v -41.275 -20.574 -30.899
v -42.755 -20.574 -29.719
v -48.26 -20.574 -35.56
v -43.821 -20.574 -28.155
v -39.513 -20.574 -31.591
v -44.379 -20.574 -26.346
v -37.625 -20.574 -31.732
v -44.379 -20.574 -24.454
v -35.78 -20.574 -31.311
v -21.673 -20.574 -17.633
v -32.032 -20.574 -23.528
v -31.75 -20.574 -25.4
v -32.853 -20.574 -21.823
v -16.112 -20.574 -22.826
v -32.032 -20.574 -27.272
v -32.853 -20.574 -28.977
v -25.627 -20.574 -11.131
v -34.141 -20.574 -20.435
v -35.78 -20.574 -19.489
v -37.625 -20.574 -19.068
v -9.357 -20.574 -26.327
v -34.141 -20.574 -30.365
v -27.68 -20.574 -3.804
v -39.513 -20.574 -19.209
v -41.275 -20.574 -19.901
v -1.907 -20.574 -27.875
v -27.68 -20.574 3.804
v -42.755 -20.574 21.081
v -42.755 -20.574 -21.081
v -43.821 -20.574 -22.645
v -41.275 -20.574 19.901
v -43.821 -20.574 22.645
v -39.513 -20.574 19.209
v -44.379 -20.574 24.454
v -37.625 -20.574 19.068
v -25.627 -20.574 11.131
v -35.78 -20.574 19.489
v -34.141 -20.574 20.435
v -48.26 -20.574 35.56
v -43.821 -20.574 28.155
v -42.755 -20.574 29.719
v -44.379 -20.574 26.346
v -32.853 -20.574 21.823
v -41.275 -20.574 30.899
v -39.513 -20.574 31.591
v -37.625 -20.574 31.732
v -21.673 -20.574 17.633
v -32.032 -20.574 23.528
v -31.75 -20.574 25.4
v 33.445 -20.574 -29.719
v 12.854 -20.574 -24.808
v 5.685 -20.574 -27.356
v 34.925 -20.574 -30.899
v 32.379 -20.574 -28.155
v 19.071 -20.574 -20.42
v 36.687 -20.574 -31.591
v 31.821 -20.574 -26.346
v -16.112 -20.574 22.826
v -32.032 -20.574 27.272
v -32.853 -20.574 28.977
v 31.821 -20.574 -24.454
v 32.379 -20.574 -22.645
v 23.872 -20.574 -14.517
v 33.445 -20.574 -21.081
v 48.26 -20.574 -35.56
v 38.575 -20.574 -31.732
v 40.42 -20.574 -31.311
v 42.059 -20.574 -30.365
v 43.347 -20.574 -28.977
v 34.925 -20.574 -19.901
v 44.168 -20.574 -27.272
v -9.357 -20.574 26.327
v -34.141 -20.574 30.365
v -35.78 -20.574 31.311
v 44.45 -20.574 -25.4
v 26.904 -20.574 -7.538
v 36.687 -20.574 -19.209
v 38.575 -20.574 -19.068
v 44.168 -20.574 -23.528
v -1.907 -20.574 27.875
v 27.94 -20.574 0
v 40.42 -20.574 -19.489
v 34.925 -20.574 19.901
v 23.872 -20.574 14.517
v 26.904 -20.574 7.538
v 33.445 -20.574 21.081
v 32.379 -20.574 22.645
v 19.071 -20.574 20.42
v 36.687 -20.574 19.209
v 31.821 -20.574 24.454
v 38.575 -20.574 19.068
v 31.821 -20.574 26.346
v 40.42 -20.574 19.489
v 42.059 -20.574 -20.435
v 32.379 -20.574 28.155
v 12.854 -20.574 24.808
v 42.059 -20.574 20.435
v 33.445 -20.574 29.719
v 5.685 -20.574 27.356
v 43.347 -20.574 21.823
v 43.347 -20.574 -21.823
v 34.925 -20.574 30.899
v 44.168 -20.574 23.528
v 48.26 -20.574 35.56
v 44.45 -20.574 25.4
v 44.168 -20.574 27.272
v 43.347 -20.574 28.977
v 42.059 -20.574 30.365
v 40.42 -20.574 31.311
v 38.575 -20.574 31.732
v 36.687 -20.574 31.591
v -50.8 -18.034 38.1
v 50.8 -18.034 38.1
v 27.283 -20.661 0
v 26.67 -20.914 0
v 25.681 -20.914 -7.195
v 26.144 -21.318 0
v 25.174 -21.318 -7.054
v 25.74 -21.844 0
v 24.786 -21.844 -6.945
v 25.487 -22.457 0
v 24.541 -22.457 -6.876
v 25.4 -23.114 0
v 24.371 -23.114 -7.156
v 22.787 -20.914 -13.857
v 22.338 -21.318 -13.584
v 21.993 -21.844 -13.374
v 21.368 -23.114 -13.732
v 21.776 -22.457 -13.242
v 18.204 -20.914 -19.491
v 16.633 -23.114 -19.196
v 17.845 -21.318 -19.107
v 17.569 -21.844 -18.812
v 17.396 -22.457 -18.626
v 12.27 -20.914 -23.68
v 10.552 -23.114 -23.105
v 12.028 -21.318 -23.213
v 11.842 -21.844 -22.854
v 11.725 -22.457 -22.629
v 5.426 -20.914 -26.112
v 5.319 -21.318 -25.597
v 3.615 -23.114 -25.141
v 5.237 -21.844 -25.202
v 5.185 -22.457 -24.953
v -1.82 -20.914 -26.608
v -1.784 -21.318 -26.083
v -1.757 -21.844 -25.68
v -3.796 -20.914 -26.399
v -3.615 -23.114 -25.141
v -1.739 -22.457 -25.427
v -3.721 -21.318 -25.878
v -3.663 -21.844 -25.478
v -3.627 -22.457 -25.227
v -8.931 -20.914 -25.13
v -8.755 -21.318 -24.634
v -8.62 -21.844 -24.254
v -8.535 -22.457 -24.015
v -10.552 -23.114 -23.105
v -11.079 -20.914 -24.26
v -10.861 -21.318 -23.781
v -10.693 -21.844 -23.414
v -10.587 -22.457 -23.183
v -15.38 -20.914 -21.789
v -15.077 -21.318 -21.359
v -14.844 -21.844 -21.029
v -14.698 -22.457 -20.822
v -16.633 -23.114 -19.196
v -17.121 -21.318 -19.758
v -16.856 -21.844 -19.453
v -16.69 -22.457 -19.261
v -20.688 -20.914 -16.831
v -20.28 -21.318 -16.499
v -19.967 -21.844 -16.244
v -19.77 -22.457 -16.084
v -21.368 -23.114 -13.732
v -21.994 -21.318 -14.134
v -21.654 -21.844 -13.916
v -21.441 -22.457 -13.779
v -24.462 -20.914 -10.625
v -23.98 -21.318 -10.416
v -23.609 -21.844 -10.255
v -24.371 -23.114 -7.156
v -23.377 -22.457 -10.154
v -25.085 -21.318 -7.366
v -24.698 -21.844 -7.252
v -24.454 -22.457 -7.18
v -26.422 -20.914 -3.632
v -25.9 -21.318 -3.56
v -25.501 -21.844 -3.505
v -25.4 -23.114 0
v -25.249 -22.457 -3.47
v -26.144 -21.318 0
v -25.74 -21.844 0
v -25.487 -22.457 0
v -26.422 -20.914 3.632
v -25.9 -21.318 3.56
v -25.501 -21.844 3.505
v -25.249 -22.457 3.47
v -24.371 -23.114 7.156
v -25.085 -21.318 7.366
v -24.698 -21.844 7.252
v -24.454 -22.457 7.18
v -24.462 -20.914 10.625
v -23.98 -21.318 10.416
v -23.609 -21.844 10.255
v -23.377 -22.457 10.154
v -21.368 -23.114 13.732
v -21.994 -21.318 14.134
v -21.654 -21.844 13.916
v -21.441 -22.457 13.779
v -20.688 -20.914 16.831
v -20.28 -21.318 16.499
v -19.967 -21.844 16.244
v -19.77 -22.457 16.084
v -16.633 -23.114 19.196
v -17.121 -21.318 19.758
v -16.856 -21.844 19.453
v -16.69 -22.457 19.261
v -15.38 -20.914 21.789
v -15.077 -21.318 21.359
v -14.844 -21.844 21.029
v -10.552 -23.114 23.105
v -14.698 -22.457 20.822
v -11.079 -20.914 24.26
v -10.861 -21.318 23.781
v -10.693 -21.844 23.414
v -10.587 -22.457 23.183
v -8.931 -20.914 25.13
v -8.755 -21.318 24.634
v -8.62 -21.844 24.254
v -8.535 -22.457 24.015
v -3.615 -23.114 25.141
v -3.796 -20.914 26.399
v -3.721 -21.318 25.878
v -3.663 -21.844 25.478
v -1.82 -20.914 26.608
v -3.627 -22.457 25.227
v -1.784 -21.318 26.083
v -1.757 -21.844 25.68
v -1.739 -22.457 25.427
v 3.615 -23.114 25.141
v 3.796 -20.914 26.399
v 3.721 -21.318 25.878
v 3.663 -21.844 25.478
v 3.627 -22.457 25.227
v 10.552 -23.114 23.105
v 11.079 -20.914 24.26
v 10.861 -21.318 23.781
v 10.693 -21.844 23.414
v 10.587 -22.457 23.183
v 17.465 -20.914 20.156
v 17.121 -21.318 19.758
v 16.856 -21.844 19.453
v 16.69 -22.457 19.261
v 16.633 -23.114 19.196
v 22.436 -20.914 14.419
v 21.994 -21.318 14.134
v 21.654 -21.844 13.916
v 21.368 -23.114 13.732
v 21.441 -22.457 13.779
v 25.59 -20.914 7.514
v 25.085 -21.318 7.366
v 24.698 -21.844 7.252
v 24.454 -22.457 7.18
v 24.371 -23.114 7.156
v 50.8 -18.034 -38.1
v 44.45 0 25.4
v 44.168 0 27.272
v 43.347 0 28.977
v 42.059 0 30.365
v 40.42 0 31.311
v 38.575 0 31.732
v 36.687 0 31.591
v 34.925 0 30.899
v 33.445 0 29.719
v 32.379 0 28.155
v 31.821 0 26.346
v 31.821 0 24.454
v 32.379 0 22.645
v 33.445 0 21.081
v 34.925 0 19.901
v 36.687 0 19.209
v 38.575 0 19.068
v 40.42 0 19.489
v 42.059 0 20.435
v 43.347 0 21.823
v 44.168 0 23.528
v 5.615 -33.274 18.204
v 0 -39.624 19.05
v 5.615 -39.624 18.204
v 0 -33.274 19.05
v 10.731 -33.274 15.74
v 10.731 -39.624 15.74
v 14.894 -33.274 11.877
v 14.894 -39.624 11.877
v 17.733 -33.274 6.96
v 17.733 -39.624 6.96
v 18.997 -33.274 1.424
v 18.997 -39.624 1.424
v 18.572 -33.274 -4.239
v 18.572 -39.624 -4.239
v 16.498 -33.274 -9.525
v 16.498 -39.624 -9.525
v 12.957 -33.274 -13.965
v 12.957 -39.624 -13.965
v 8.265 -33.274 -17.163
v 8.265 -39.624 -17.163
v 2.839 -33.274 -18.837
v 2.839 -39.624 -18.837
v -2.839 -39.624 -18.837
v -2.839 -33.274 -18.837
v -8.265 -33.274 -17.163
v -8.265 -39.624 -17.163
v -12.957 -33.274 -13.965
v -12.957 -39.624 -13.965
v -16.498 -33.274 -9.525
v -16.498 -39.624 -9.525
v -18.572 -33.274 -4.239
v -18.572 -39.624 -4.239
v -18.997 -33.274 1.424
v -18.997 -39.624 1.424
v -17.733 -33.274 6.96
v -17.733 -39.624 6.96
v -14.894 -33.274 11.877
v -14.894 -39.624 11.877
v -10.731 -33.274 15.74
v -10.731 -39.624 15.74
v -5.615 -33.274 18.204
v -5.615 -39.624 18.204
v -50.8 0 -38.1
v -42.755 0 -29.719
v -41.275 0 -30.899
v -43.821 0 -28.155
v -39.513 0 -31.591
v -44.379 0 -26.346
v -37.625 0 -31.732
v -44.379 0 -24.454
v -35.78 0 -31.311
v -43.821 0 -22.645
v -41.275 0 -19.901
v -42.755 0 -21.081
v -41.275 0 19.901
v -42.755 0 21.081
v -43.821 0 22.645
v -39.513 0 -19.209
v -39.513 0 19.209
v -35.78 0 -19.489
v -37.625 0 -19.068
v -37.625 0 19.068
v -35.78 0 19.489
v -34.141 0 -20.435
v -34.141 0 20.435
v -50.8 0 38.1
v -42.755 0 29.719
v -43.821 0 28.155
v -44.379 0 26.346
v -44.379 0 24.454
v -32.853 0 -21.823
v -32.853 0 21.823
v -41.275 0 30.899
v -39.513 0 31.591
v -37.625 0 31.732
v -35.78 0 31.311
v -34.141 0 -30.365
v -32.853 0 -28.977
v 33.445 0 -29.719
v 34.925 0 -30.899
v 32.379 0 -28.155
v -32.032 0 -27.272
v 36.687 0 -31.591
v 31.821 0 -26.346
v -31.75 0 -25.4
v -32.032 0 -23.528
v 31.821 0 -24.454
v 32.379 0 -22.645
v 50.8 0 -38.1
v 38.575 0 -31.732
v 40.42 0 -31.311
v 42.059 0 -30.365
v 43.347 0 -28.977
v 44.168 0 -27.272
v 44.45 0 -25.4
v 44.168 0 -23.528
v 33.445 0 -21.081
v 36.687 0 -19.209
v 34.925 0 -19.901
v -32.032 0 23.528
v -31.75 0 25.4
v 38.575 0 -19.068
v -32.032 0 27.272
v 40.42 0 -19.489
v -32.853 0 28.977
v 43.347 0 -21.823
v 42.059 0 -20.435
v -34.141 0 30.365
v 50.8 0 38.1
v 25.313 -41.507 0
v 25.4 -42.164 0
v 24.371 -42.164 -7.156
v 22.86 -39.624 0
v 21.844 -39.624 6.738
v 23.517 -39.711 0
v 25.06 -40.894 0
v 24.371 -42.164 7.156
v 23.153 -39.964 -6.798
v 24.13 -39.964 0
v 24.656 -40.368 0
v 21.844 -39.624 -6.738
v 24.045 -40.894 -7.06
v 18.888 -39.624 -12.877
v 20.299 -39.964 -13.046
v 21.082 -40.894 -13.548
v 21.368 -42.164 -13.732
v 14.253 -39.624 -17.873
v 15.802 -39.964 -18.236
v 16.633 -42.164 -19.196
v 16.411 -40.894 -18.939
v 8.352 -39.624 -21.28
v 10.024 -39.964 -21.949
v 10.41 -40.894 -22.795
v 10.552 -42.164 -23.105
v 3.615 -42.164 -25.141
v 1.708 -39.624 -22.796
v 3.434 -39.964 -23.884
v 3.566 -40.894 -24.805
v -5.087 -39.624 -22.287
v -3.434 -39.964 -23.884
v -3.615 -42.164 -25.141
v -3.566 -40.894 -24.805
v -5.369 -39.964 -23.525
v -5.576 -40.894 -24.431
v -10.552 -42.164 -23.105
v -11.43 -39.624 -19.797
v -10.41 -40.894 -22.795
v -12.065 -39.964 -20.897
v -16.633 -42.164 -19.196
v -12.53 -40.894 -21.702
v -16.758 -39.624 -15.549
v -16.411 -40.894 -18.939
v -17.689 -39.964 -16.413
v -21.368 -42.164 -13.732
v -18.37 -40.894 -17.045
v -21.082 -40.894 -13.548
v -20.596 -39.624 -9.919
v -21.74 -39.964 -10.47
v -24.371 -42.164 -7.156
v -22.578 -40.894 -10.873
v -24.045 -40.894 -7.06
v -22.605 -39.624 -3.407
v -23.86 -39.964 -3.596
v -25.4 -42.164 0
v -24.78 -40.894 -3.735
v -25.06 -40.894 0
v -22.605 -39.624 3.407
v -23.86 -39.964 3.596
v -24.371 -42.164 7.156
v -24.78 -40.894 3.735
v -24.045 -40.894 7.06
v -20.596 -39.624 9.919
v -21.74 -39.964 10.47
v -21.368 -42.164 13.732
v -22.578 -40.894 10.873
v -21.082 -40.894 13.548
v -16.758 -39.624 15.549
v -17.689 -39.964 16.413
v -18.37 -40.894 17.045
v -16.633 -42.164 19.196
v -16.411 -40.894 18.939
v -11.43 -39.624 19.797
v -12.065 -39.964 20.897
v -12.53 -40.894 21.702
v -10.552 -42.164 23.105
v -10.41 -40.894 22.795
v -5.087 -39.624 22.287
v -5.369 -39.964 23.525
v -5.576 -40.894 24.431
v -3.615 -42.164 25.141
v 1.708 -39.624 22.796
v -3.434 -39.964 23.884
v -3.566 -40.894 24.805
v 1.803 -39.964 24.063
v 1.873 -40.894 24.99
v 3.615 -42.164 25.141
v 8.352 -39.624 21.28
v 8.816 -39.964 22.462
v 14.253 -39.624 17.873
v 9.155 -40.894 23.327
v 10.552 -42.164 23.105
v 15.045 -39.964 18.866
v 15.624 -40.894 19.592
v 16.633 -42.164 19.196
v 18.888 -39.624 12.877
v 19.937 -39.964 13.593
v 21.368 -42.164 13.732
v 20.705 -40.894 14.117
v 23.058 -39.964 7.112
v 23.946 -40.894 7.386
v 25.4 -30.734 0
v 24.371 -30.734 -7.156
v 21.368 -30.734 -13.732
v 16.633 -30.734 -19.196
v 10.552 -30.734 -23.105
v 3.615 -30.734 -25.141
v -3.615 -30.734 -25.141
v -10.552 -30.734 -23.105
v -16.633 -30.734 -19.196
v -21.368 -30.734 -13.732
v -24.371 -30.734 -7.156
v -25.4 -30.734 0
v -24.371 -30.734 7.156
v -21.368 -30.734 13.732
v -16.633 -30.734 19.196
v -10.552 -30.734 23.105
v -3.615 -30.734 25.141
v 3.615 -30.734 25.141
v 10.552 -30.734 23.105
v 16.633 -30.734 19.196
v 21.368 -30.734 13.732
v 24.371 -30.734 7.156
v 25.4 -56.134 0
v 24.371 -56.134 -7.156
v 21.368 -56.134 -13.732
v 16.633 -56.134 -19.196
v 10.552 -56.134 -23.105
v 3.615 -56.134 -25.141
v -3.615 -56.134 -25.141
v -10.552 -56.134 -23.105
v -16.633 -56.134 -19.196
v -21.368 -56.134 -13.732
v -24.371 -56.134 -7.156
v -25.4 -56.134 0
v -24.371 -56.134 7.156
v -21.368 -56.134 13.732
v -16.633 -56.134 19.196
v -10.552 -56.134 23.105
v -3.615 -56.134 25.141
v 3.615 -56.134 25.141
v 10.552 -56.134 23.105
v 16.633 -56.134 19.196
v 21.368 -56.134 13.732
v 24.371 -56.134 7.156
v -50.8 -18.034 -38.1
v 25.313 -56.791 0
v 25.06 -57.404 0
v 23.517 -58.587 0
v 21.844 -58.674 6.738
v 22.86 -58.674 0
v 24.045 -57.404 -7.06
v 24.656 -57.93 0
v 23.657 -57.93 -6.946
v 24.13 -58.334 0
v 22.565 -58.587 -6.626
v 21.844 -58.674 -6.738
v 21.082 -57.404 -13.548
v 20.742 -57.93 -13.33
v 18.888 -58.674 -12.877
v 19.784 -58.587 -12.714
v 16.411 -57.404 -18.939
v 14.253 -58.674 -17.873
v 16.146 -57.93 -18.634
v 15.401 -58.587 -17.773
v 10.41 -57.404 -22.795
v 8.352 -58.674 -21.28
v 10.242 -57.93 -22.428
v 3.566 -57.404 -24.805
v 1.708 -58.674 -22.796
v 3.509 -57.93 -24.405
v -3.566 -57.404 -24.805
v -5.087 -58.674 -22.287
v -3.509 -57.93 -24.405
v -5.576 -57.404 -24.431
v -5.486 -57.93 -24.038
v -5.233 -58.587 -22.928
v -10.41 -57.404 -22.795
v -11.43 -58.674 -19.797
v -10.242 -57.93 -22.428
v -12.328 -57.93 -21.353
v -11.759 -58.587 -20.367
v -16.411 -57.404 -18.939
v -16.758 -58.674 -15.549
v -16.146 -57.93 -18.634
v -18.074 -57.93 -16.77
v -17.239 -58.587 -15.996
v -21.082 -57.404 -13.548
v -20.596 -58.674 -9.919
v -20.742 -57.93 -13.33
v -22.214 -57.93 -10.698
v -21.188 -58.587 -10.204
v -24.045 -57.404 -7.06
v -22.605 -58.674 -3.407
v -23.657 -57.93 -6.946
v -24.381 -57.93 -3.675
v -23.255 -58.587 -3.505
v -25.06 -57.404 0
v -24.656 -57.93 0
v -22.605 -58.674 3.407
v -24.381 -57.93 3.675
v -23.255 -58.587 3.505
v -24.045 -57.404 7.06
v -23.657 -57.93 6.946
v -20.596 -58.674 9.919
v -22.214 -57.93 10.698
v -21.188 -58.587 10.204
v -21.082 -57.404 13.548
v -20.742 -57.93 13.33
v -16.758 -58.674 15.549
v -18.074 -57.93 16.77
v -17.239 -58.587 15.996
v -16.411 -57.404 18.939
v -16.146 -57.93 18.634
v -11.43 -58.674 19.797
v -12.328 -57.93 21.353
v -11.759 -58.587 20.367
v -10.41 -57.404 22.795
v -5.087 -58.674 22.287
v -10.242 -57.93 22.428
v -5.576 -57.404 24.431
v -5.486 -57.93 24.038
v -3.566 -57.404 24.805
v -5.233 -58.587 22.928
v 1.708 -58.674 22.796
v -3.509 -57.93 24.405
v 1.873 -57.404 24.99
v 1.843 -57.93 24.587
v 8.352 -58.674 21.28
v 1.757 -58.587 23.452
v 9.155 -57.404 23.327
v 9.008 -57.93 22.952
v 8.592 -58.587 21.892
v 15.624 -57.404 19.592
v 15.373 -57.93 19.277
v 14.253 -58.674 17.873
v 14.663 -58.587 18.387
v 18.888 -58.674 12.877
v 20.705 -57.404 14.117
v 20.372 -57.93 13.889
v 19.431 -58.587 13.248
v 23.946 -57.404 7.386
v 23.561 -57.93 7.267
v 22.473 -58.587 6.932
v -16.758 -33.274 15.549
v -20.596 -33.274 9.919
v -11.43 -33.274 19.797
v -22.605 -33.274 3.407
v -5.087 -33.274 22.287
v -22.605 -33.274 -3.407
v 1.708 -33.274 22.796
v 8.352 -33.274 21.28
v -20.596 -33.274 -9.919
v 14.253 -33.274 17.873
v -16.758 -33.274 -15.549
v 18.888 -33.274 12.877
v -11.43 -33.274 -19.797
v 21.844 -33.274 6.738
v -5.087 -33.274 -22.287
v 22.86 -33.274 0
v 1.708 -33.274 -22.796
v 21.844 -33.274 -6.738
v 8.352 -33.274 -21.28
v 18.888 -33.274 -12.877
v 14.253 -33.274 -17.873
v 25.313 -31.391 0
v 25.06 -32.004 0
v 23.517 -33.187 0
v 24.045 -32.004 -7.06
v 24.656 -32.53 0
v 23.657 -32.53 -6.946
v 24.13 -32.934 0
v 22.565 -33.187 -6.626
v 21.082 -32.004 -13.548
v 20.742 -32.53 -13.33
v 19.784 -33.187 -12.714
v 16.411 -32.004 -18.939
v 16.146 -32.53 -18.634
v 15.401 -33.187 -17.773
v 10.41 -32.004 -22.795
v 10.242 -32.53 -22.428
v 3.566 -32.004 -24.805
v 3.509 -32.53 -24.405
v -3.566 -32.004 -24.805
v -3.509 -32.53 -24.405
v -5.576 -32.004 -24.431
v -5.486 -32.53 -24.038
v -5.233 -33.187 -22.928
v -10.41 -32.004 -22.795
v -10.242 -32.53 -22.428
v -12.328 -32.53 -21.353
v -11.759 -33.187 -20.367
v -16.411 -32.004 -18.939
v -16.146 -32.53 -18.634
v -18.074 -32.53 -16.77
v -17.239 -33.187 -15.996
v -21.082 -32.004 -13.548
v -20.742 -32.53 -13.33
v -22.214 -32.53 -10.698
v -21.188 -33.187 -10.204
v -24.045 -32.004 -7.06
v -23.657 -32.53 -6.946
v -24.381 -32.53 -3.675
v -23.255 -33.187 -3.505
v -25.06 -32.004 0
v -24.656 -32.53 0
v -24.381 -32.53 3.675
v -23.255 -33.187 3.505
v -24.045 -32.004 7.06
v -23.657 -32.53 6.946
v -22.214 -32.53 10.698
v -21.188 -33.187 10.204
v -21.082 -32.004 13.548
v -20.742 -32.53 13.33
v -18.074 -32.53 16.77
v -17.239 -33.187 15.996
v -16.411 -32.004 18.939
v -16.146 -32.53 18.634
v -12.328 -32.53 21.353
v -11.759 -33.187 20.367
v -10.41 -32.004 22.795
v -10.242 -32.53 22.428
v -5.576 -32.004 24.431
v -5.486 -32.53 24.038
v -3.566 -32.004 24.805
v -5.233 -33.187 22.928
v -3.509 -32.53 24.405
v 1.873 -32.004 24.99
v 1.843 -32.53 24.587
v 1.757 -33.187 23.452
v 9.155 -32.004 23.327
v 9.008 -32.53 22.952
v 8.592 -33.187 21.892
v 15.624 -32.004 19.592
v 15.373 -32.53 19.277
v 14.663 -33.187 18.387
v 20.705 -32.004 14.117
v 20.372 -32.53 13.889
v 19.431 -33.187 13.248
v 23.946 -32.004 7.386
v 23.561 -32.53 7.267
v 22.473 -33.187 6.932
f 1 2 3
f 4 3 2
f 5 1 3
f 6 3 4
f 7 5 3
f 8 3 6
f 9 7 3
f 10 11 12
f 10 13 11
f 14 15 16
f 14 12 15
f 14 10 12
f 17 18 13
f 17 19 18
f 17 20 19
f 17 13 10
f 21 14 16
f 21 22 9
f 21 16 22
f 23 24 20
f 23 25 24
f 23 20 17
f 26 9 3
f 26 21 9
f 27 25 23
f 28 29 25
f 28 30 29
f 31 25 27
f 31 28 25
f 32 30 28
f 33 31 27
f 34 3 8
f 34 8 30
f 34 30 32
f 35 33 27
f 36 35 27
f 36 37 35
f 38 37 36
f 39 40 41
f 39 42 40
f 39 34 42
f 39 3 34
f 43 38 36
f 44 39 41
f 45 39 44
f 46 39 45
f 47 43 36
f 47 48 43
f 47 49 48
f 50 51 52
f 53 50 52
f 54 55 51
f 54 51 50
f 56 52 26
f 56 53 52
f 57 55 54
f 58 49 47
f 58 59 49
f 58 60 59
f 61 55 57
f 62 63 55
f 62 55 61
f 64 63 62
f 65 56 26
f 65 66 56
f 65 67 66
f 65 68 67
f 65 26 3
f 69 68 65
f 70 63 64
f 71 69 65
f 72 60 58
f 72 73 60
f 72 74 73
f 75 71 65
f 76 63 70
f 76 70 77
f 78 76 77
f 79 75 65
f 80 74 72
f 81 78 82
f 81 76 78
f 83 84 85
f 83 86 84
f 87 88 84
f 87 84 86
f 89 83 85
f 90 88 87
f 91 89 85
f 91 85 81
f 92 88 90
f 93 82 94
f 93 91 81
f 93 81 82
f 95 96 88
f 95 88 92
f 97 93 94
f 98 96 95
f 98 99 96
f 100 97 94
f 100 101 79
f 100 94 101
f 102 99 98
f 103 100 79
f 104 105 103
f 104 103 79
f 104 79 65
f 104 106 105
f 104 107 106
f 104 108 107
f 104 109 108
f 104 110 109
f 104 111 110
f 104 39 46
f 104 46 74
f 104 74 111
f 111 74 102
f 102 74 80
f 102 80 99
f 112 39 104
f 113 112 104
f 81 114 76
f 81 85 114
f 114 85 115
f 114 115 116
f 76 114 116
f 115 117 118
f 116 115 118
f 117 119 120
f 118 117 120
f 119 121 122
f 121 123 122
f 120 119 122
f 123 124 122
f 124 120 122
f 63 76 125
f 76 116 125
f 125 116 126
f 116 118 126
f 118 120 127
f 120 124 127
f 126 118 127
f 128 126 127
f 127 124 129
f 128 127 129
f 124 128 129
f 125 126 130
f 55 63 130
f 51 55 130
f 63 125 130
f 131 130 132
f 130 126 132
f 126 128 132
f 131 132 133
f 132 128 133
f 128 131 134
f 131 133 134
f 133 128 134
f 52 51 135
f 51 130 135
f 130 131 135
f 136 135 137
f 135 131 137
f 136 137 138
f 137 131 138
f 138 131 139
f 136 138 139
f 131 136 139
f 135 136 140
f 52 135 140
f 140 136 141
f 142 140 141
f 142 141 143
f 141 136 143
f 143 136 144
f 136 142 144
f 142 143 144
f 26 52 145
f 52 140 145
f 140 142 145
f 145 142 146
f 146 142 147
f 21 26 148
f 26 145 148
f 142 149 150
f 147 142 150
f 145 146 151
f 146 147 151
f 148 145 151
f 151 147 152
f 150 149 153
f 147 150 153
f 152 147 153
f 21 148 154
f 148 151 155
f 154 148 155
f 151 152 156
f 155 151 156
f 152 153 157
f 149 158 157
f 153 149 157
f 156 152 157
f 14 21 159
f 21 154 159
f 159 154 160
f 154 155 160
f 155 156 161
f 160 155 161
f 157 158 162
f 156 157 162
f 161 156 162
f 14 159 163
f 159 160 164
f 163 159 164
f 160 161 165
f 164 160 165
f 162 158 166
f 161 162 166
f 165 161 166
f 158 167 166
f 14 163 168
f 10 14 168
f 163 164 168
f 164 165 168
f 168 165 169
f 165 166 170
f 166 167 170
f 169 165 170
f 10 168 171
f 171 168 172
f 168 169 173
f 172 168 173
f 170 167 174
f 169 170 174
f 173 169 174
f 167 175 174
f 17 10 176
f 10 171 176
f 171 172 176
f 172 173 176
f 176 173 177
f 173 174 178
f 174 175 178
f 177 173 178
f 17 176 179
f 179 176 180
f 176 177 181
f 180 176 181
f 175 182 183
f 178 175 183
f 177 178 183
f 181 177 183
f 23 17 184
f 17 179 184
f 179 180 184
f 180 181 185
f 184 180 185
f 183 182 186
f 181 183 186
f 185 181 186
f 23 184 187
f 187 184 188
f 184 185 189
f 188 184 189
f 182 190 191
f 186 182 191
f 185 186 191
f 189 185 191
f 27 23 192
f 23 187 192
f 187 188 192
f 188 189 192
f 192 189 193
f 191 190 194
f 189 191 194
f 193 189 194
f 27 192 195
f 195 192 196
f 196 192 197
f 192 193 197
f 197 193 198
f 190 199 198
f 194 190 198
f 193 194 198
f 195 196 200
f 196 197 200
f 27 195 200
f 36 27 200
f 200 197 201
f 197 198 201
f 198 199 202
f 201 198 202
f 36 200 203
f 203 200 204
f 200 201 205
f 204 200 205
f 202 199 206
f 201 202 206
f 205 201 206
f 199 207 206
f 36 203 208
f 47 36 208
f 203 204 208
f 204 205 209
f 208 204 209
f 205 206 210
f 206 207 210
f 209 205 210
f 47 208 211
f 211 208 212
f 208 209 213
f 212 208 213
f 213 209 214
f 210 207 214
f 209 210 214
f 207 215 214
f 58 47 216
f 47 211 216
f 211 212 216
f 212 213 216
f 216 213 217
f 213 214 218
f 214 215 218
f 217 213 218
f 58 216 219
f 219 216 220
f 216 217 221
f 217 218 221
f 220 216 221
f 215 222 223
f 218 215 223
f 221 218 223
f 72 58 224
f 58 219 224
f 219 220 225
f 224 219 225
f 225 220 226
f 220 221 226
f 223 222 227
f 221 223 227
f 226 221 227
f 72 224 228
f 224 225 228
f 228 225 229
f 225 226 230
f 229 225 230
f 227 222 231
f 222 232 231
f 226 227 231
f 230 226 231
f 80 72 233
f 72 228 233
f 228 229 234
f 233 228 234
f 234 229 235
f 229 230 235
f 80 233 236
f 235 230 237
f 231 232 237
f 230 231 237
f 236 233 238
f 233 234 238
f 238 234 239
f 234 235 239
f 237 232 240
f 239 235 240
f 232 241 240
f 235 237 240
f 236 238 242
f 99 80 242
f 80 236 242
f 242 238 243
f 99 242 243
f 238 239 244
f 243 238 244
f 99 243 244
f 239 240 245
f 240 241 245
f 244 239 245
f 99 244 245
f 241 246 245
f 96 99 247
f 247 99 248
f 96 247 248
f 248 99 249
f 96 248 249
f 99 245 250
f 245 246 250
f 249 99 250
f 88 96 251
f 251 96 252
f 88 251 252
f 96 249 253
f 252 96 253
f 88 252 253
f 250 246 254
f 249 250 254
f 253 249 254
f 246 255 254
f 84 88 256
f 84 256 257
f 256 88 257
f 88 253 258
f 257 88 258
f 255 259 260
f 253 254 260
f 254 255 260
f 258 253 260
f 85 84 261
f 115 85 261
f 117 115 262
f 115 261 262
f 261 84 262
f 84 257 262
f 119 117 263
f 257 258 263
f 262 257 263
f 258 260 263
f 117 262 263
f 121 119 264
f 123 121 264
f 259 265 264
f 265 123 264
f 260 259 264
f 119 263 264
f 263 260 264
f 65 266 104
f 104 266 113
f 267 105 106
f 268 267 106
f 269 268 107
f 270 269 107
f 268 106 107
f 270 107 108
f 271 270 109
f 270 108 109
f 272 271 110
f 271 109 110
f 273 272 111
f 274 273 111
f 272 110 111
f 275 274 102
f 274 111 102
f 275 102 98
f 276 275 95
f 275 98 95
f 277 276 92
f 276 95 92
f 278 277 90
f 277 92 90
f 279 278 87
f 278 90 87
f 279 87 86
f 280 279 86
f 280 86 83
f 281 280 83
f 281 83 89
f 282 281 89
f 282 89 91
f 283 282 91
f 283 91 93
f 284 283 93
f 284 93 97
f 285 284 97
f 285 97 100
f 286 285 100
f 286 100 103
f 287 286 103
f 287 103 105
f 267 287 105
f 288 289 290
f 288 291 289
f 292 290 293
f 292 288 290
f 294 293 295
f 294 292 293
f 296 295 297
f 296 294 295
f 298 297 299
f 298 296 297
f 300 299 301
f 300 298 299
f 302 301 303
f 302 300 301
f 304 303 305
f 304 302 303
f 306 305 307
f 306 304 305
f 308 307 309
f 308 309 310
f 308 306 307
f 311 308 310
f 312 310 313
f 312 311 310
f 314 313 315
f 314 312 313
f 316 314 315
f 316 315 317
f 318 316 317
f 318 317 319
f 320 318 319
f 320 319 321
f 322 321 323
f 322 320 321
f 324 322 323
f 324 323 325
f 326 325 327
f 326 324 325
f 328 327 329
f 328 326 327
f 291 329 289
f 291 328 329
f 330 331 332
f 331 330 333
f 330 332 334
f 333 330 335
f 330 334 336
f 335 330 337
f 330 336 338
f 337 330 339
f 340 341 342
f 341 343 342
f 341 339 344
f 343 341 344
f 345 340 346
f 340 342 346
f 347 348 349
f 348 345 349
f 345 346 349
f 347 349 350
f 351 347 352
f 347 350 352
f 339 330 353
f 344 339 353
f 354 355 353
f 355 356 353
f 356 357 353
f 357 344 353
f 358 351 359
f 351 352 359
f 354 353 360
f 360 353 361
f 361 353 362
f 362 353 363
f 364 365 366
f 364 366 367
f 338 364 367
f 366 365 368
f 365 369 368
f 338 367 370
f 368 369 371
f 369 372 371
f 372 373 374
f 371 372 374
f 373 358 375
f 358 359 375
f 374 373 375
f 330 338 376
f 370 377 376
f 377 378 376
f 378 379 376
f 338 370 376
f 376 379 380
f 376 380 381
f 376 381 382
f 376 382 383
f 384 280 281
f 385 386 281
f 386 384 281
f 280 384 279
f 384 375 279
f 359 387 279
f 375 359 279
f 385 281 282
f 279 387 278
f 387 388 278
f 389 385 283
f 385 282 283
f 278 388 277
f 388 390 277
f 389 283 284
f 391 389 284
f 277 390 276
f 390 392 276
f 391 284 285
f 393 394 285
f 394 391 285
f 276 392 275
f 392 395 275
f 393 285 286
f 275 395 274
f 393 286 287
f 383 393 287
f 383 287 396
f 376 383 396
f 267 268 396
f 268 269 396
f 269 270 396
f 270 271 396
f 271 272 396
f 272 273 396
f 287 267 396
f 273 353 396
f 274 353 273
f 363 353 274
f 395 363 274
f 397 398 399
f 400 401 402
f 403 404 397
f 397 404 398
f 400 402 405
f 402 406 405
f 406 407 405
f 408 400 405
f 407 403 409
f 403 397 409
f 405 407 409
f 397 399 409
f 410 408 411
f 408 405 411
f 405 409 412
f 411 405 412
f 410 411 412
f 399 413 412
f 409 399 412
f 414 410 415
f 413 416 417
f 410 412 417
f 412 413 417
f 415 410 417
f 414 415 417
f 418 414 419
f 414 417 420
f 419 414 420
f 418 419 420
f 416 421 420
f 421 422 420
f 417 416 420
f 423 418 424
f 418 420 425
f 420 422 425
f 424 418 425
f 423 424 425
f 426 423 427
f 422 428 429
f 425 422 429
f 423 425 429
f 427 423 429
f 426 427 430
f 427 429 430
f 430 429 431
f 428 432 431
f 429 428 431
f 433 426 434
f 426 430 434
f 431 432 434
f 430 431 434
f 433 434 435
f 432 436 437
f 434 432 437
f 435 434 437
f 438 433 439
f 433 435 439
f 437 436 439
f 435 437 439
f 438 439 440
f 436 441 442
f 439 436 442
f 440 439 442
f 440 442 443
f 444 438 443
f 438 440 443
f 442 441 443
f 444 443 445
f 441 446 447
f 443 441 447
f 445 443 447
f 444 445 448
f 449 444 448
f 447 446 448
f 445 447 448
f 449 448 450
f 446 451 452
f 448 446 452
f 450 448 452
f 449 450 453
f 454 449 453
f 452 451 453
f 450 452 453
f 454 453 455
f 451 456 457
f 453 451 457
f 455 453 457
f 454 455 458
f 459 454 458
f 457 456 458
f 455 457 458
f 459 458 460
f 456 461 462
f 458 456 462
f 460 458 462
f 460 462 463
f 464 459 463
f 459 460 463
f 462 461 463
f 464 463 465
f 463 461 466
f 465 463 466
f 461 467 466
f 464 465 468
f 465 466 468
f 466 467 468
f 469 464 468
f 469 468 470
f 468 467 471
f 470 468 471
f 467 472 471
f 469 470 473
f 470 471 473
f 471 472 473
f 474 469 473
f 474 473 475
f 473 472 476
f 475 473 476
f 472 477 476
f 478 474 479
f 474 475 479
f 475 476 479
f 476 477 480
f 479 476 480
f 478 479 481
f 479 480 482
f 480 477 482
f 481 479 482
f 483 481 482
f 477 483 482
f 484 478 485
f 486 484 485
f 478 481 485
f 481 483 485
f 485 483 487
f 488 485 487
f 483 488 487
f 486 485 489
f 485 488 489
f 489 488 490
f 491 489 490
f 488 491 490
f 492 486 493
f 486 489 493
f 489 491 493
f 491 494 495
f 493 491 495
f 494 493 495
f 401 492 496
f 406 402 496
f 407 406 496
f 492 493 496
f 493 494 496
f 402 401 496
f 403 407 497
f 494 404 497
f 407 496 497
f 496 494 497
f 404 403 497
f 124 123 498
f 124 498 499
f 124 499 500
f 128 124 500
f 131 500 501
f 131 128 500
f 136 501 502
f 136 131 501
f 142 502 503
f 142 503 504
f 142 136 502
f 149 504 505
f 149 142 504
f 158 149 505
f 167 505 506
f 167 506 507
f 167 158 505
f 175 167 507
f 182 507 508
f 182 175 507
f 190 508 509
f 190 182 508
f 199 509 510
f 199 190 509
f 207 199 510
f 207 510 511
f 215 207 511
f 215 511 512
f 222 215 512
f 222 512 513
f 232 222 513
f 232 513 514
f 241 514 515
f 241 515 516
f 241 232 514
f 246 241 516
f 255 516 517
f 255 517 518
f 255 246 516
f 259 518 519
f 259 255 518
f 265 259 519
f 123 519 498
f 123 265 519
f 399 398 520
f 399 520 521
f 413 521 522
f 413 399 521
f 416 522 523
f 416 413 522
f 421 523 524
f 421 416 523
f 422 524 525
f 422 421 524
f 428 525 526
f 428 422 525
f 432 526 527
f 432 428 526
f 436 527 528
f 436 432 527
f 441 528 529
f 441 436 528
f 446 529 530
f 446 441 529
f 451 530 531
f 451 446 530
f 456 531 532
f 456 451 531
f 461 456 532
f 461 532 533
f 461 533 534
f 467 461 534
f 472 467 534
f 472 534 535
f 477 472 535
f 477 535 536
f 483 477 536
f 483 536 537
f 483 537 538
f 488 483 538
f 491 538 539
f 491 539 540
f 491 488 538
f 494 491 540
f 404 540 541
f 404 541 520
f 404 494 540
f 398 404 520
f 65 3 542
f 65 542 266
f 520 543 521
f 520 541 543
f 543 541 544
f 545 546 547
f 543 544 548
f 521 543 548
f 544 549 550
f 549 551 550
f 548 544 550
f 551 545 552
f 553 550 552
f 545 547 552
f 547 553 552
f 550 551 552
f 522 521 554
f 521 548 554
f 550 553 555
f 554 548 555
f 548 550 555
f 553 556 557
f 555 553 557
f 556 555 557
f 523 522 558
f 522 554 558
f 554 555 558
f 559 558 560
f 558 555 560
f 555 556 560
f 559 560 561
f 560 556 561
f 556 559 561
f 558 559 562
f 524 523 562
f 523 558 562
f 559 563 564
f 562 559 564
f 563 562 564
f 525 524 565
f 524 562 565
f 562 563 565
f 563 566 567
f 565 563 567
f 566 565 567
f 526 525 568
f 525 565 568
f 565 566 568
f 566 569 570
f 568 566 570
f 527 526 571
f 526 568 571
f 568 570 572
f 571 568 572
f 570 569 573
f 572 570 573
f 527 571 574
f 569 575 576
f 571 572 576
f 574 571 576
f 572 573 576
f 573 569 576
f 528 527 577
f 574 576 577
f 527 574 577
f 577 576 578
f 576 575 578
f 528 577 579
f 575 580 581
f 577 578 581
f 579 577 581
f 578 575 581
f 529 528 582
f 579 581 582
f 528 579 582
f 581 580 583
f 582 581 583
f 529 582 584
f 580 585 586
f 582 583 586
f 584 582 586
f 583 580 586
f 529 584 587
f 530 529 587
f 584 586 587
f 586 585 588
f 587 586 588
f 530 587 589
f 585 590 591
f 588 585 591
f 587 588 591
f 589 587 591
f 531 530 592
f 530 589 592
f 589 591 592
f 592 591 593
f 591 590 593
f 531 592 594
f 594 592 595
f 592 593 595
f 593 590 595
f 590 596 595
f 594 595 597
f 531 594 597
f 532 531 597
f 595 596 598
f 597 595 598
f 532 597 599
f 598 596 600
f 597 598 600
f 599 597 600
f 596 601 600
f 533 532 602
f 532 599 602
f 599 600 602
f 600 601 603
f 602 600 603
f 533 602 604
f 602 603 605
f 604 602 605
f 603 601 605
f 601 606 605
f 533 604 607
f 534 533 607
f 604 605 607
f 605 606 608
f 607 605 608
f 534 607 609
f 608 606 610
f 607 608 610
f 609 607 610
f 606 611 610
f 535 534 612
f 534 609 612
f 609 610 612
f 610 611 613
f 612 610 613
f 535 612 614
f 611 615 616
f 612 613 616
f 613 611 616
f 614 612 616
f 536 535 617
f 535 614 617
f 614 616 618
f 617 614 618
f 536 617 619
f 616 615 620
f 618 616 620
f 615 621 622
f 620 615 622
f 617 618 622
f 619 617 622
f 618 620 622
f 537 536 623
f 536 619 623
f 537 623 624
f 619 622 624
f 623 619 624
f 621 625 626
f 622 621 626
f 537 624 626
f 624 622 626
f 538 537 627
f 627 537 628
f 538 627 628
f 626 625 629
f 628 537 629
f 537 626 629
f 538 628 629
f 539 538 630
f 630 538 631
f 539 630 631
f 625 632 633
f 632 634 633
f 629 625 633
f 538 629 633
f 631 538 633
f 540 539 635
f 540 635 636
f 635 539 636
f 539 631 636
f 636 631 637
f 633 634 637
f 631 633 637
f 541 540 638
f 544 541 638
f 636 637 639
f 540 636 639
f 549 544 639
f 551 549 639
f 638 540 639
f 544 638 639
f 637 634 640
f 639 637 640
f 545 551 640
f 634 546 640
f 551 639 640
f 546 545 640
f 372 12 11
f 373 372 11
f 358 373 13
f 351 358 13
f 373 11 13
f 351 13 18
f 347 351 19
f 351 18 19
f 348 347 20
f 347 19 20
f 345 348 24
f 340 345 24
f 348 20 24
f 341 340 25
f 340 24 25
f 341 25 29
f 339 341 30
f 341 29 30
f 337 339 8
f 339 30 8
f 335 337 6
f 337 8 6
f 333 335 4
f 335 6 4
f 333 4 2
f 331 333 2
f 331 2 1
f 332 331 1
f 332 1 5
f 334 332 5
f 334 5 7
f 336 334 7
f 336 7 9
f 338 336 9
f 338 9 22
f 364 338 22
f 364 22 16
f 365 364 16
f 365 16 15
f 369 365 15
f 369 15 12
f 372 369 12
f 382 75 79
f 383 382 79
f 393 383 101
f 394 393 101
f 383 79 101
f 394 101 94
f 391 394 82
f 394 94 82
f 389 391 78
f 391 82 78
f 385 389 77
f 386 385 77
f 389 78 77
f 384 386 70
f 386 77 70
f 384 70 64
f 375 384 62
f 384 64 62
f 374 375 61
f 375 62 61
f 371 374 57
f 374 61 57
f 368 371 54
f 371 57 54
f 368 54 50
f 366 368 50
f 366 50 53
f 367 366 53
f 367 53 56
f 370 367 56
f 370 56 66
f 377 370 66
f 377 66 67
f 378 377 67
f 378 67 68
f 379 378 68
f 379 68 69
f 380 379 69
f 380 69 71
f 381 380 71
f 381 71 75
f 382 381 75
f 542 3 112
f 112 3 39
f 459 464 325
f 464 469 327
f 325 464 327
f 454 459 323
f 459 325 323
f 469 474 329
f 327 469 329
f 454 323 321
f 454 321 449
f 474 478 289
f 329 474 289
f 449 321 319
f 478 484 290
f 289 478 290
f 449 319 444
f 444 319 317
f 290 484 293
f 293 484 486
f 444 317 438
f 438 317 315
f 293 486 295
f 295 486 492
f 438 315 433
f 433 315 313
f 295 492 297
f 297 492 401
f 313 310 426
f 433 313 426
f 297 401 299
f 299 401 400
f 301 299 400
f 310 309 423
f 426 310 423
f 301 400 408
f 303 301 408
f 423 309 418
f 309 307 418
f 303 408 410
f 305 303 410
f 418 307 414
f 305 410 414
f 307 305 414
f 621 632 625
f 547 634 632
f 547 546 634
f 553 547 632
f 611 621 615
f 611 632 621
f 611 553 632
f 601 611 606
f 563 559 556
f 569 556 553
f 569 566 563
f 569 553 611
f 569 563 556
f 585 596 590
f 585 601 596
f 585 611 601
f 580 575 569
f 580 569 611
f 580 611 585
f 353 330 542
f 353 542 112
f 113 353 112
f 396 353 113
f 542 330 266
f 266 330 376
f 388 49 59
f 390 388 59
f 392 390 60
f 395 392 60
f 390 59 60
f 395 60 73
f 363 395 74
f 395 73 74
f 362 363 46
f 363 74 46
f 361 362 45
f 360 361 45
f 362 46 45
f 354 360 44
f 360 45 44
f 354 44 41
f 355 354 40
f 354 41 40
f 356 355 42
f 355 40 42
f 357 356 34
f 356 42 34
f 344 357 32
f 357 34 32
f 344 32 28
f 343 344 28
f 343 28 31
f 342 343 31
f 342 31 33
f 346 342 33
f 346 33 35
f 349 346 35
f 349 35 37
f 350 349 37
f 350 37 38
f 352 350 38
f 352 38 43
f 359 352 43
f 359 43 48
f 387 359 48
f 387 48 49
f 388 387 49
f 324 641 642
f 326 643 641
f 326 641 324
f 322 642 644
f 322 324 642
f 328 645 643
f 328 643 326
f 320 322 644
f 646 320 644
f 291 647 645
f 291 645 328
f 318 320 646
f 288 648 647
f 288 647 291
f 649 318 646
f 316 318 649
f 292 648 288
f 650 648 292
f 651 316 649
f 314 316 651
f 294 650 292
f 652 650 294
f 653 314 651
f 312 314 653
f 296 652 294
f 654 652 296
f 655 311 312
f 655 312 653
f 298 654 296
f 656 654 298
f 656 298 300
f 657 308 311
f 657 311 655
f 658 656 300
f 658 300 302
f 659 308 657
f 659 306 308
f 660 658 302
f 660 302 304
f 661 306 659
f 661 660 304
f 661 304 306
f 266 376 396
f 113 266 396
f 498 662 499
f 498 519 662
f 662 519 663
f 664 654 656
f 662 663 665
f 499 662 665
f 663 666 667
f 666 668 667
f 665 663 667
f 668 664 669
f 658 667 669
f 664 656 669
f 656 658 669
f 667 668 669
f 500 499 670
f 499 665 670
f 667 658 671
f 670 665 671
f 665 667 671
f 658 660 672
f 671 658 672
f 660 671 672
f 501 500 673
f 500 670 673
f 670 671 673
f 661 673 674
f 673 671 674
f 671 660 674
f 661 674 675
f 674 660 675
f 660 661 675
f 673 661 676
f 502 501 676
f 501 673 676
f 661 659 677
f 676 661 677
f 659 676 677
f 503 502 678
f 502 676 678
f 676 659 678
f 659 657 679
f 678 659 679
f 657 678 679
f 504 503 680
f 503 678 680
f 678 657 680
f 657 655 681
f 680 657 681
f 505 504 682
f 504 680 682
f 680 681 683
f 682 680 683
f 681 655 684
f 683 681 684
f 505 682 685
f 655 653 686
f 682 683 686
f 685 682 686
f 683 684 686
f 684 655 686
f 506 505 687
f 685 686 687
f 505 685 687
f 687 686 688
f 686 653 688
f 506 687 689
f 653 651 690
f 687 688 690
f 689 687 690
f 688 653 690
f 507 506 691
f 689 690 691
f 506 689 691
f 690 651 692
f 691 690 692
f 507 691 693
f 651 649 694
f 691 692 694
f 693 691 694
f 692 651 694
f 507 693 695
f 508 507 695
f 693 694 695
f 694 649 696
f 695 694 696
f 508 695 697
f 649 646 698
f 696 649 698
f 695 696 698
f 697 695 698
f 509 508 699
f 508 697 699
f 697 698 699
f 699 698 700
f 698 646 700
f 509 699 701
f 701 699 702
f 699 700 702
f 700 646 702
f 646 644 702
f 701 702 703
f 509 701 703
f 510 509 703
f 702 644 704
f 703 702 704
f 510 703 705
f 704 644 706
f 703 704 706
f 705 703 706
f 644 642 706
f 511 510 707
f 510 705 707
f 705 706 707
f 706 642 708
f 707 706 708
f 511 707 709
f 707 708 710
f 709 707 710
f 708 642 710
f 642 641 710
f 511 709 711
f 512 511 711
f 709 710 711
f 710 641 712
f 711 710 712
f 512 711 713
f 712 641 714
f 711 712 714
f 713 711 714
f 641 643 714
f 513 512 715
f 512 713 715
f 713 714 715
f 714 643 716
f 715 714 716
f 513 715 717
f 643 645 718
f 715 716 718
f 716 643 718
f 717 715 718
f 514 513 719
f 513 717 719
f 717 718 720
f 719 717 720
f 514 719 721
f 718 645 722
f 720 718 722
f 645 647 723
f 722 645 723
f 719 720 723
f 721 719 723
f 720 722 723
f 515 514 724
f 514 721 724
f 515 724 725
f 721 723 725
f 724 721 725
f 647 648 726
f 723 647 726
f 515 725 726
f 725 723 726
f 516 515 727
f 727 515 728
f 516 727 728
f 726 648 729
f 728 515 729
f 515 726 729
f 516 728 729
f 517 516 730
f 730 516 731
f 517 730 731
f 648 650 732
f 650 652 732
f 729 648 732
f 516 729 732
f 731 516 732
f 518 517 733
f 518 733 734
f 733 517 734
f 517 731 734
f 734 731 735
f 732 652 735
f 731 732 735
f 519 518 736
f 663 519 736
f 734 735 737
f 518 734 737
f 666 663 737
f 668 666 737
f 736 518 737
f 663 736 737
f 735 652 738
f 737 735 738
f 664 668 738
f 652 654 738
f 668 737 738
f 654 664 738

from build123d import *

# Parameters (mm, degrees)
F0_W     = 101.6
F0_H     = 76.2
F1_DEPTH = 20.574
F2_R     = 6.35
F3_DEPTH = 25.4
F4_W     = 25.4
F4_H     = 38.1
F6_W     = 6.35
F6_H     = 14.2712268918
F8_SIZE  = 2.54
F9_R     = 2.54
F10_R    = 2.54


with BuildPart() as f1:
    # F0 (on Front) → F1 (new body)
    with BuildSketch(Plane.XZ):
        Rectangle(F0_W, F0_H)
    extrude(amount=F1_DEPTH)

    # F2 (on face) → F3 (cut)
    with BuildSketch(Plane.XZ.offset(20.574)):
        with Locations((38.1, -25.4)):
            Circle(F2_R)
        with Locations((-38.1, -25.4)):
            Circle(F2_R)
        with Locations((-38.1, 25.4)):
            Circle(F2_R)
        with Locations((38.1, 25.4)):
            Circle(F2_R)
    extrude(amount=-F3_DEPTH, mode=Mode.SUBTRACT)

    # F4 (on Top) → F5 (revolve)
    with BuildSketch(Plane.XY):
        with Locations((12.7, -39.624)):
            Rectangle(F4_W, F4_H)
    revolve(axis=Axis((0, -39.624, 0), (0, 1, 0)))

    # F6 (on Right) → F7 (revolve, cut)
    with BuildSketch(Plane.YZ):
        with Locations((-36.449, 26.1856134459)):
            Rectangle(F6_W, F6_H)
    revolve(axis=Axis((0, -58.674, 0), (0, 1, 0)), mode=Mode.SUBTRACT)

    # F8
    f8_edges = [f1.edges().sort_by_distance(p)[0] for p in [
        (0, -20.574, 38.1),
        (50.8, -20.574, 0),
        (0, -20.574, -38.1),
        (-50.8, -20.574, 0),
    ]]
    chamfer(f8_edges, length=F8_SIZE)

    # F9
    f9_edges = [f1.edges().sort_by_distance(p)[0] for p in [
        (-25.4, -20.574, 0),
        (-25.4, -33.274, 0),
        (-25.4, -39.624, 0),
    ]]
    fillet(f9_edges, radius=F9_R)

    # F10
    f10_edges = [f1.edges().sort_by_distance(p)[0] for p in [
        (-25.4, -58.674, 0),
    ]]
    fillet(f10_edges, radius=F10_R)


solid = f1.part
